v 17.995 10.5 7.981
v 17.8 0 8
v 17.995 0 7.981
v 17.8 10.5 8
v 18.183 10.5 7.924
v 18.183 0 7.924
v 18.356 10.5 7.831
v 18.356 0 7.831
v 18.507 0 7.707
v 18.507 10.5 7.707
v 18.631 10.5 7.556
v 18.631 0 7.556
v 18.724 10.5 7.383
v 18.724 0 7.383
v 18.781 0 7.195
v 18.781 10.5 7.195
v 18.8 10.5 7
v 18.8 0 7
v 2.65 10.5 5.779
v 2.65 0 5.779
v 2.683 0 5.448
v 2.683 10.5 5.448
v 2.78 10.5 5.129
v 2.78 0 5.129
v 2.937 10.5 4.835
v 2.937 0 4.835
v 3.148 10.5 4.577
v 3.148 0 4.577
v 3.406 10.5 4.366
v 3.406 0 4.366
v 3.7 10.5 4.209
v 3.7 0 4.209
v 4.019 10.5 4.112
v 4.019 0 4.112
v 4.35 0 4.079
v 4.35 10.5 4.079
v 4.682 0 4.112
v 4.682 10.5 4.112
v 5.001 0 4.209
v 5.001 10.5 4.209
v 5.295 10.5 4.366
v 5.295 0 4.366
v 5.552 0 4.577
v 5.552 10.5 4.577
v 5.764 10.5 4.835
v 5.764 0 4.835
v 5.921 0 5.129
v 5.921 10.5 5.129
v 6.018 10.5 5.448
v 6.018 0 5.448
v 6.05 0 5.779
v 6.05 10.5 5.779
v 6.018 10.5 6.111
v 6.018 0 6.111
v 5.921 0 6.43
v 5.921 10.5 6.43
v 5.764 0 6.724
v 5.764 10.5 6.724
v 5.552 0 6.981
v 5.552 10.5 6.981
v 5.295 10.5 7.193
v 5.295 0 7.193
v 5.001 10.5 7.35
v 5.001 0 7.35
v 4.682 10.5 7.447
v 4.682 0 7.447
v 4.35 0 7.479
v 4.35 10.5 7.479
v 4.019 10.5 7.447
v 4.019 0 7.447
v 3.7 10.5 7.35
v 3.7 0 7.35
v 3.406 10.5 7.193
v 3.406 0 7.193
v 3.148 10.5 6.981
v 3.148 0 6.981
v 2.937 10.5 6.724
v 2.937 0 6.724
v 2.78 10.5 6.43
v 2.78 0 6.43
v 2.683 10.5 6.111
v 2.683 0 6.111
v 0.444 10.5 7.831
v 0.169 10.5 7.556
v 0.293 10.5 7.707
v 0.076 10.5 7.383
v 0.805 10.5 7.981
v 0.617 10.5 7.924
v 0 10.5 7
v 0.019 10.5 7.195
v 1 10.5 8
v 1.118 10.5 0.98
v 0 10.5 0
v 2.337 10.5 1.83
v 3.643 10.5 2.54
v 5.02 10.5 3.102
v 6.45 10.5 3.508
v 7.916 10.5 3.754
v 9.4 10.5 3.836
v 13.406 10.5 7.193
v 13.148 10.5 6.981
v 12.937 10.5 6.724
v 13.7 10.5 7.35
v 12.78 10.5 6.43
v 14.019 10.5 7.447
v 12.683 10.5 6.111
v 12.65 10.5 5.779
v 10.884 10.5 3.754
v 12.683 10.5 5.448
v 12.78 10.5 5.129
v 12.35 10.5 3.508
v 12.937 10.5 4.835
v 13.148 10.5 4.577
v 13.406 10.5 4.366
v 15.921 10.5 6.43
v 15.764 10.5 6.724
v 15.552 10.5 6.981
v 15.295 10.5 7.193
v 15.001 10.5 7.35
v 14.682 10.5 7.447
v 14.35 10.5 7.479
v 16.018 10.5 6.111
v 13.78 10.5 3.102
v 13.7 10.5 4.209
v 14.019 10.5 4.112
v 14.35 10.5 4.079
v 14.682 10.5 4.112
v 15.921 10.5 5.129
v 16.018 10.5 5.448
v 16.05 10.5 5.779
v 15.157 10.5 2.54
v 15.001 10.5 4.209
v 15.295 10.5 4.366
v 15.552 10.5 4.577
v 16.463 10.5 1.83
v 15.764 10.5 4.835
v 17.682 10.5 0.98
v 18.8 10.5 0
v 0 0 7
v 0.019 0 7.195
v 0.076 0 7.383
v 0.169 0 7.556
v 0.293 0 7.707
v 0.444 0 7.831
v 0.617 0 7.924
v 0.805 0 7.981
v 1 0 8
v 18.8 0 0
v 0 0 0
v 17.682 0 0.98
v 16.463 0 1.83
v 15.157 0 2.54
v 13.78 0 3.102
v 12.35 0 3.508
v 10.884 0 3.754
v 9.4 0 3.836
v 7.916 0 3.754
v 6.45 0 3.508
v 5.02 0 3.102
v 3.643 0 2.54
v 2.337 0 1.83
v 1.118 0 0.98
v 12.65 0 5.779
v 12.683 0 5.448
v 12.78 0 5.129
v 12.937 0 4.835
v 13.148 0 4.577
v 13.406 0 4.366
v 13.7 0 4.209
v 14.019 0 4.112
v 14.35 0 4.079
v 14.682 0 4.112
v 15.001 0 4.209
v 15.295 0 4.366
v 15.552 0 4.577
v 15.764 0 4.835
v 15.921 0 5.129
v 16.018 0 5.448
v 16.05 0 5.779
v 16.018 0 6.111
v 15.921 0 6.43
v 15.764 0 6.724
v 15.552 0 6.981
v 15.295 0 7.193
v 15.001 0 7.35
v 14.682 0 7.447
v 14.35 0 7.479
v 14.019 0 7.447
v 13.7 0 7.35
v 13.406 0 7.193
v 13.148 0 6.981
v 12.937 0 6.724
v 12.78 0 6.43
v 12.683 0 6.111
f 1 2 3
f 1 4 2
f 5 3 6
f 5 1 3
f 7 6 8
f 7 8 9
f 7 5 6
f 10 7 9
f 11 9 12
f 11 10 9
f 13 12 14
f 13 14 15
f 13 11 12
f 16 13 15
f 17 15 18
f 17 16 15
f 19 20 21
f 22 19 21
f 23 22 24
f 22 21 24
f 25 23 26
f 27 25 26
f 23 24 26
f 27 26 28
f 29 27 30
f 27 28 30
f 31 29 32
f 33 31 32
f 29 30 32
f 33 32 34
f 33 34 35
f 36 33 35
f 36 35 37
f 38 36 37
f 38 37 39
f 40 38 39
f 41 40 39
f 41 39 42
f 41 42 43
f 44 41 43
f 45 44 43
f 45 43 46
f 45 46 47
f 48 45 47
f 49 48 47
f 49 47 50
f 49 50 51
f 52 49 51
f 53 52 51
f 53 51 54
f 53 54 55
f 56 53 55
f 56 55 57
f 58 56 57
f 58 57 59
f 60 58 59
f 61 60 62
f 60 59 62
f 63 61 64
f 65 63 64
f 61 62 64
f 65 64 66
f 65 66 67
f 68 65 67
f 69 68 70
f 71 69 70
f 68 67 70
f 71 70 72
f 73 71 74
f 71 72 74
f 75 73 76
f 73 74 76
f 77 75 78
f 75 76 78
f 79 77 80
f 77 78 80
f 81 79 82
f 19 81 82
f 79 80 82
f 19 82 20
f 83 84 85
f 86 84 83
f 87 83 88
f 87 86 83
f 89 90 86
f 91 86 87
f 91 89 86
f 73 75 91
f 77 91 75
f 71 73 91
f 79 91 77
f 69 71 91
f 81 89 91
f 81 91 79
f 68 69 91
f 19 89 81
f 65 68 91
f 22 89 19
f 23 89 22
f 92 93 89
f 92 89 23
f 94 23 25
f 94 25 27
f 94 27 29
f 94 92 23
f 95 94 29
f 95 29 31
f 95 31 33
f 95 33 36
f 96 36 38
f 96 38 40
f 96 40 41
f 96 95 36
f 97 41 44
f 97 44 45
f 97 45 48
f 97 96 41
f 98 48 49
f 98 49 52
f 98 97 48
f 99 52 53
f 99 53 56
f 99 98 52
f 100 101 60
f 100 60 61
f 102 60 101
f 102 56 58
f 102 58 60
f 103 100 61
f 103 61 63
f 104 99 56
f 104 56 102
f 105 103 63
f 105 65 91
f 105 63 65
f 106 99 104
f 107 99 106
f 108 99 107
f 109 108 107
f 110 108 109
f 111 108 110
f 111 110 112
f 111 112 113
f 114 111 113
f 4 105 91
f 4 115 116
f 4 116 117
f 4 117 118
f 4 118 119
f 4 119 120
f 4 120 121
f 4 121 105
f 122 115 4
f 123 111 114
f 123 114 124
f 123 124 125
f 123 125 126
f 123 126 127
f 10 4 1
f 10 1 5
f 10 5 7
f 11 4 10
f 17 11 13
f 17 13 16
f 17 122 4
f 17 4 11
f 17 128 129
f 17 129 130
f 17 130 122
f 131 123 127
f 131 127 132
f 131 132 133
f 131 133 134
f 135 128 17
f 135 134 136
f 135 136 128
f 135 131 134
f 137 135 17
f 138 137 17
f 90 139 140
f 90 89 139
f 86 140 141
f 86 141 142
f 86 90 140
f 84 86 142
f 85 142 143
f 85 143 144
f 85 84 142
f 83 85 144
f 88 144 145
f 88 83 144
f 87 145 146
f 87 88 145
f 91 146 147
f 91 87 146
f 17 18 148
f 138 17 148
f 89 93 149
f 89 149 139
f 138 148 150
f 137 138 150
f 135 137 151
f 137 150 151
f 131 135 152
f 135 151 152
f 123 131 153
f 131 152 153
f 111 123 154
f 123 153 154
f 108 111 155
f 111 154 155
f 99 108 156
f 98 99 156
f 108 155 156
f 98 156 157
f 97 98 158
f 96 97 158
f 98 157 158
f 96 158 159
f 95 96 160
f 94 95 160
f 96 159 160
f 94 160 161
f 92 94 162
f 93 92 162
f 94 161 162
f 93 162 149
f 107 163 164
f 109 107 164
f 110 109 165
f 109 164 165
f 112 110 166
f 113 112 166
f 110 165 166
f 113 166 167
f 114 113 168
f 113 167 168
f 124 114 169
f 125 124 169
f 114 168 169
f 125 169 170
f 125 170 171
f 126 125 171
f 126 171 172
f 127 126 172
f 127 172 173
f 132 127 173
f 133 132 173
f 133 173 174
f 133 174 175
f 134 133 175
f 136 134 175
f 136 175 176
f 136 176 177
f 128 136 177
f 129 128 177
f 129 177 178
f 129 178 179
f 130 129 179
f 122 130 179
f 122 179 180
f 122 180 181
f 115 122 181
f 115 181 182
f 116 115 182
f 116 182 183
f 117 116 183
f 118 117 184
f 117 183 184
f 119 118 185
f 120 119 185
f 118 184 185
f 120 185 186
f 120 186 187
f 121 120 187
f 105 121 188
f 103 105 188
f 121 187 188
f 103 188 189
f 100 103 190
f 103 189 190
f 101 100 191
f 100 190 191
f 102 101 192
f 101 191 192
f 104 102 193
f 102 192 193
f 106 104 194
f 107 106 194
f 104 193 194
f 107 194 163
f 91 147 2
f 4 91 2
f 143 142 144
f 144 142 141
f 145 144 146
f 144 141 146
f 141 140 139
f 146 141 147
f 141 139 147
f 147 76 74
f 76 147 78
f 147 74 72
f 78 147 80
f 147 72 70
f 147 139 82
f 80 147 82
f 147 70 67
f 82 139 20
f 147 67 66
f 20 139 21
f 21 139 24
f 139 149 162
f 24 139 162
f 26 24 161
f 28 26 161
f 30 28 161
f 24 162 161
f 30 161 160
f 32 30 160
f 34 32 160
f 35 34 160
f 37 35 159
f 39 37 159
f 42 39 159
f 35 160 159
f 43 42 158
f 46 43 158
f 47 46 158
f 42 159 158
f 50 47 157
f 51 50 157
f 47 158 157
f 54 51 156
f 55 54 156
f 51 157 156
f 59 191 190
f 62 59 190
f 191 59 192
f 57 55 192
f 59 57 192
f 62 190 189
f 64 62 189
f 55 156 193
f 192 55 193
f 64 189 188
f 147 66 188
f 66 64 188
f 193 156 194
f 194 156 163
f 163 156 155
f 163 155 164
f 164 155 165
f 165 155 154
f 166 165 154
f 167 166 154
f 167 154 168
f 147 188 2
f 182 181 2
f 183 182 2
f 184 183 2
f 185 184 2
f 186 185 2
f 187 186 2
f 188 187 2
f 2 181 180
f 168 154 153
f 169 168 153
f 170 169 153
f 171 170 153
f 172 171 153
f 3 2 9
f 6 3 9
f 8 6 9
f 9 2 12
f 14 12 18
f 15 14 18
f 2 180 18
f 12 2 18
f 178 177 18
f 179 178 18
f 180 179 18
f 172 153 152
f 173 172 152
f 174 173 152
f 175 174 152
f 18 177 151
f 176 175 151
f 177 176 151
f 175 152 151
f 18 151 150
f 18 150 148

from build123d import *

# Parameters (mm, degrees)
EXTRUDE_1_DEPTH   = 10.5
FILLET_1_R        = 1
HOLE_WIZARD_M31_D = 3.4


with BuildPart() as part:
    # Эскиз1 → Бобышка-Вытянуть1 (new body)
    with BuildSketch(Plane(origin=(0, 0, 0), x_dir=(1, 0, 0), z_dir=(0, 1, 0))):
        with BuildLine():
            Line((0, 0), (0, -8))
            Line((0, -8), (18.8, -8))
            Line((18.8, -8), (18.8, 0))
            ThreePointArc((18.8, 0), (9.4, -3.835773145), (0, 0))
        make_face()
    extrude(amount=EXTRUDE_1_DEPTH)

    # Скругление1
    fillet_1_edges = [part.edges().sort_by_distance(p)[0] for p in [
        (18.8, 5.25, 8),
        (0, 5.25, 8),
    ]]
    fillet(fillet_1_edges, radius=FILLET_1_R)

    # Отверстие с зазором M31 (through all)
    with Locations(Plane(origin=(0, 10.5, 0), x_dir=(1, 0, 0), z_dir=(0, 1, 0))):
        with Locations((4.350247301, -5.779226371), (14.350247301, -5.779226371)):
            Hole(HOLE_WIZARD_M31_D / 2)


solid = part.part
